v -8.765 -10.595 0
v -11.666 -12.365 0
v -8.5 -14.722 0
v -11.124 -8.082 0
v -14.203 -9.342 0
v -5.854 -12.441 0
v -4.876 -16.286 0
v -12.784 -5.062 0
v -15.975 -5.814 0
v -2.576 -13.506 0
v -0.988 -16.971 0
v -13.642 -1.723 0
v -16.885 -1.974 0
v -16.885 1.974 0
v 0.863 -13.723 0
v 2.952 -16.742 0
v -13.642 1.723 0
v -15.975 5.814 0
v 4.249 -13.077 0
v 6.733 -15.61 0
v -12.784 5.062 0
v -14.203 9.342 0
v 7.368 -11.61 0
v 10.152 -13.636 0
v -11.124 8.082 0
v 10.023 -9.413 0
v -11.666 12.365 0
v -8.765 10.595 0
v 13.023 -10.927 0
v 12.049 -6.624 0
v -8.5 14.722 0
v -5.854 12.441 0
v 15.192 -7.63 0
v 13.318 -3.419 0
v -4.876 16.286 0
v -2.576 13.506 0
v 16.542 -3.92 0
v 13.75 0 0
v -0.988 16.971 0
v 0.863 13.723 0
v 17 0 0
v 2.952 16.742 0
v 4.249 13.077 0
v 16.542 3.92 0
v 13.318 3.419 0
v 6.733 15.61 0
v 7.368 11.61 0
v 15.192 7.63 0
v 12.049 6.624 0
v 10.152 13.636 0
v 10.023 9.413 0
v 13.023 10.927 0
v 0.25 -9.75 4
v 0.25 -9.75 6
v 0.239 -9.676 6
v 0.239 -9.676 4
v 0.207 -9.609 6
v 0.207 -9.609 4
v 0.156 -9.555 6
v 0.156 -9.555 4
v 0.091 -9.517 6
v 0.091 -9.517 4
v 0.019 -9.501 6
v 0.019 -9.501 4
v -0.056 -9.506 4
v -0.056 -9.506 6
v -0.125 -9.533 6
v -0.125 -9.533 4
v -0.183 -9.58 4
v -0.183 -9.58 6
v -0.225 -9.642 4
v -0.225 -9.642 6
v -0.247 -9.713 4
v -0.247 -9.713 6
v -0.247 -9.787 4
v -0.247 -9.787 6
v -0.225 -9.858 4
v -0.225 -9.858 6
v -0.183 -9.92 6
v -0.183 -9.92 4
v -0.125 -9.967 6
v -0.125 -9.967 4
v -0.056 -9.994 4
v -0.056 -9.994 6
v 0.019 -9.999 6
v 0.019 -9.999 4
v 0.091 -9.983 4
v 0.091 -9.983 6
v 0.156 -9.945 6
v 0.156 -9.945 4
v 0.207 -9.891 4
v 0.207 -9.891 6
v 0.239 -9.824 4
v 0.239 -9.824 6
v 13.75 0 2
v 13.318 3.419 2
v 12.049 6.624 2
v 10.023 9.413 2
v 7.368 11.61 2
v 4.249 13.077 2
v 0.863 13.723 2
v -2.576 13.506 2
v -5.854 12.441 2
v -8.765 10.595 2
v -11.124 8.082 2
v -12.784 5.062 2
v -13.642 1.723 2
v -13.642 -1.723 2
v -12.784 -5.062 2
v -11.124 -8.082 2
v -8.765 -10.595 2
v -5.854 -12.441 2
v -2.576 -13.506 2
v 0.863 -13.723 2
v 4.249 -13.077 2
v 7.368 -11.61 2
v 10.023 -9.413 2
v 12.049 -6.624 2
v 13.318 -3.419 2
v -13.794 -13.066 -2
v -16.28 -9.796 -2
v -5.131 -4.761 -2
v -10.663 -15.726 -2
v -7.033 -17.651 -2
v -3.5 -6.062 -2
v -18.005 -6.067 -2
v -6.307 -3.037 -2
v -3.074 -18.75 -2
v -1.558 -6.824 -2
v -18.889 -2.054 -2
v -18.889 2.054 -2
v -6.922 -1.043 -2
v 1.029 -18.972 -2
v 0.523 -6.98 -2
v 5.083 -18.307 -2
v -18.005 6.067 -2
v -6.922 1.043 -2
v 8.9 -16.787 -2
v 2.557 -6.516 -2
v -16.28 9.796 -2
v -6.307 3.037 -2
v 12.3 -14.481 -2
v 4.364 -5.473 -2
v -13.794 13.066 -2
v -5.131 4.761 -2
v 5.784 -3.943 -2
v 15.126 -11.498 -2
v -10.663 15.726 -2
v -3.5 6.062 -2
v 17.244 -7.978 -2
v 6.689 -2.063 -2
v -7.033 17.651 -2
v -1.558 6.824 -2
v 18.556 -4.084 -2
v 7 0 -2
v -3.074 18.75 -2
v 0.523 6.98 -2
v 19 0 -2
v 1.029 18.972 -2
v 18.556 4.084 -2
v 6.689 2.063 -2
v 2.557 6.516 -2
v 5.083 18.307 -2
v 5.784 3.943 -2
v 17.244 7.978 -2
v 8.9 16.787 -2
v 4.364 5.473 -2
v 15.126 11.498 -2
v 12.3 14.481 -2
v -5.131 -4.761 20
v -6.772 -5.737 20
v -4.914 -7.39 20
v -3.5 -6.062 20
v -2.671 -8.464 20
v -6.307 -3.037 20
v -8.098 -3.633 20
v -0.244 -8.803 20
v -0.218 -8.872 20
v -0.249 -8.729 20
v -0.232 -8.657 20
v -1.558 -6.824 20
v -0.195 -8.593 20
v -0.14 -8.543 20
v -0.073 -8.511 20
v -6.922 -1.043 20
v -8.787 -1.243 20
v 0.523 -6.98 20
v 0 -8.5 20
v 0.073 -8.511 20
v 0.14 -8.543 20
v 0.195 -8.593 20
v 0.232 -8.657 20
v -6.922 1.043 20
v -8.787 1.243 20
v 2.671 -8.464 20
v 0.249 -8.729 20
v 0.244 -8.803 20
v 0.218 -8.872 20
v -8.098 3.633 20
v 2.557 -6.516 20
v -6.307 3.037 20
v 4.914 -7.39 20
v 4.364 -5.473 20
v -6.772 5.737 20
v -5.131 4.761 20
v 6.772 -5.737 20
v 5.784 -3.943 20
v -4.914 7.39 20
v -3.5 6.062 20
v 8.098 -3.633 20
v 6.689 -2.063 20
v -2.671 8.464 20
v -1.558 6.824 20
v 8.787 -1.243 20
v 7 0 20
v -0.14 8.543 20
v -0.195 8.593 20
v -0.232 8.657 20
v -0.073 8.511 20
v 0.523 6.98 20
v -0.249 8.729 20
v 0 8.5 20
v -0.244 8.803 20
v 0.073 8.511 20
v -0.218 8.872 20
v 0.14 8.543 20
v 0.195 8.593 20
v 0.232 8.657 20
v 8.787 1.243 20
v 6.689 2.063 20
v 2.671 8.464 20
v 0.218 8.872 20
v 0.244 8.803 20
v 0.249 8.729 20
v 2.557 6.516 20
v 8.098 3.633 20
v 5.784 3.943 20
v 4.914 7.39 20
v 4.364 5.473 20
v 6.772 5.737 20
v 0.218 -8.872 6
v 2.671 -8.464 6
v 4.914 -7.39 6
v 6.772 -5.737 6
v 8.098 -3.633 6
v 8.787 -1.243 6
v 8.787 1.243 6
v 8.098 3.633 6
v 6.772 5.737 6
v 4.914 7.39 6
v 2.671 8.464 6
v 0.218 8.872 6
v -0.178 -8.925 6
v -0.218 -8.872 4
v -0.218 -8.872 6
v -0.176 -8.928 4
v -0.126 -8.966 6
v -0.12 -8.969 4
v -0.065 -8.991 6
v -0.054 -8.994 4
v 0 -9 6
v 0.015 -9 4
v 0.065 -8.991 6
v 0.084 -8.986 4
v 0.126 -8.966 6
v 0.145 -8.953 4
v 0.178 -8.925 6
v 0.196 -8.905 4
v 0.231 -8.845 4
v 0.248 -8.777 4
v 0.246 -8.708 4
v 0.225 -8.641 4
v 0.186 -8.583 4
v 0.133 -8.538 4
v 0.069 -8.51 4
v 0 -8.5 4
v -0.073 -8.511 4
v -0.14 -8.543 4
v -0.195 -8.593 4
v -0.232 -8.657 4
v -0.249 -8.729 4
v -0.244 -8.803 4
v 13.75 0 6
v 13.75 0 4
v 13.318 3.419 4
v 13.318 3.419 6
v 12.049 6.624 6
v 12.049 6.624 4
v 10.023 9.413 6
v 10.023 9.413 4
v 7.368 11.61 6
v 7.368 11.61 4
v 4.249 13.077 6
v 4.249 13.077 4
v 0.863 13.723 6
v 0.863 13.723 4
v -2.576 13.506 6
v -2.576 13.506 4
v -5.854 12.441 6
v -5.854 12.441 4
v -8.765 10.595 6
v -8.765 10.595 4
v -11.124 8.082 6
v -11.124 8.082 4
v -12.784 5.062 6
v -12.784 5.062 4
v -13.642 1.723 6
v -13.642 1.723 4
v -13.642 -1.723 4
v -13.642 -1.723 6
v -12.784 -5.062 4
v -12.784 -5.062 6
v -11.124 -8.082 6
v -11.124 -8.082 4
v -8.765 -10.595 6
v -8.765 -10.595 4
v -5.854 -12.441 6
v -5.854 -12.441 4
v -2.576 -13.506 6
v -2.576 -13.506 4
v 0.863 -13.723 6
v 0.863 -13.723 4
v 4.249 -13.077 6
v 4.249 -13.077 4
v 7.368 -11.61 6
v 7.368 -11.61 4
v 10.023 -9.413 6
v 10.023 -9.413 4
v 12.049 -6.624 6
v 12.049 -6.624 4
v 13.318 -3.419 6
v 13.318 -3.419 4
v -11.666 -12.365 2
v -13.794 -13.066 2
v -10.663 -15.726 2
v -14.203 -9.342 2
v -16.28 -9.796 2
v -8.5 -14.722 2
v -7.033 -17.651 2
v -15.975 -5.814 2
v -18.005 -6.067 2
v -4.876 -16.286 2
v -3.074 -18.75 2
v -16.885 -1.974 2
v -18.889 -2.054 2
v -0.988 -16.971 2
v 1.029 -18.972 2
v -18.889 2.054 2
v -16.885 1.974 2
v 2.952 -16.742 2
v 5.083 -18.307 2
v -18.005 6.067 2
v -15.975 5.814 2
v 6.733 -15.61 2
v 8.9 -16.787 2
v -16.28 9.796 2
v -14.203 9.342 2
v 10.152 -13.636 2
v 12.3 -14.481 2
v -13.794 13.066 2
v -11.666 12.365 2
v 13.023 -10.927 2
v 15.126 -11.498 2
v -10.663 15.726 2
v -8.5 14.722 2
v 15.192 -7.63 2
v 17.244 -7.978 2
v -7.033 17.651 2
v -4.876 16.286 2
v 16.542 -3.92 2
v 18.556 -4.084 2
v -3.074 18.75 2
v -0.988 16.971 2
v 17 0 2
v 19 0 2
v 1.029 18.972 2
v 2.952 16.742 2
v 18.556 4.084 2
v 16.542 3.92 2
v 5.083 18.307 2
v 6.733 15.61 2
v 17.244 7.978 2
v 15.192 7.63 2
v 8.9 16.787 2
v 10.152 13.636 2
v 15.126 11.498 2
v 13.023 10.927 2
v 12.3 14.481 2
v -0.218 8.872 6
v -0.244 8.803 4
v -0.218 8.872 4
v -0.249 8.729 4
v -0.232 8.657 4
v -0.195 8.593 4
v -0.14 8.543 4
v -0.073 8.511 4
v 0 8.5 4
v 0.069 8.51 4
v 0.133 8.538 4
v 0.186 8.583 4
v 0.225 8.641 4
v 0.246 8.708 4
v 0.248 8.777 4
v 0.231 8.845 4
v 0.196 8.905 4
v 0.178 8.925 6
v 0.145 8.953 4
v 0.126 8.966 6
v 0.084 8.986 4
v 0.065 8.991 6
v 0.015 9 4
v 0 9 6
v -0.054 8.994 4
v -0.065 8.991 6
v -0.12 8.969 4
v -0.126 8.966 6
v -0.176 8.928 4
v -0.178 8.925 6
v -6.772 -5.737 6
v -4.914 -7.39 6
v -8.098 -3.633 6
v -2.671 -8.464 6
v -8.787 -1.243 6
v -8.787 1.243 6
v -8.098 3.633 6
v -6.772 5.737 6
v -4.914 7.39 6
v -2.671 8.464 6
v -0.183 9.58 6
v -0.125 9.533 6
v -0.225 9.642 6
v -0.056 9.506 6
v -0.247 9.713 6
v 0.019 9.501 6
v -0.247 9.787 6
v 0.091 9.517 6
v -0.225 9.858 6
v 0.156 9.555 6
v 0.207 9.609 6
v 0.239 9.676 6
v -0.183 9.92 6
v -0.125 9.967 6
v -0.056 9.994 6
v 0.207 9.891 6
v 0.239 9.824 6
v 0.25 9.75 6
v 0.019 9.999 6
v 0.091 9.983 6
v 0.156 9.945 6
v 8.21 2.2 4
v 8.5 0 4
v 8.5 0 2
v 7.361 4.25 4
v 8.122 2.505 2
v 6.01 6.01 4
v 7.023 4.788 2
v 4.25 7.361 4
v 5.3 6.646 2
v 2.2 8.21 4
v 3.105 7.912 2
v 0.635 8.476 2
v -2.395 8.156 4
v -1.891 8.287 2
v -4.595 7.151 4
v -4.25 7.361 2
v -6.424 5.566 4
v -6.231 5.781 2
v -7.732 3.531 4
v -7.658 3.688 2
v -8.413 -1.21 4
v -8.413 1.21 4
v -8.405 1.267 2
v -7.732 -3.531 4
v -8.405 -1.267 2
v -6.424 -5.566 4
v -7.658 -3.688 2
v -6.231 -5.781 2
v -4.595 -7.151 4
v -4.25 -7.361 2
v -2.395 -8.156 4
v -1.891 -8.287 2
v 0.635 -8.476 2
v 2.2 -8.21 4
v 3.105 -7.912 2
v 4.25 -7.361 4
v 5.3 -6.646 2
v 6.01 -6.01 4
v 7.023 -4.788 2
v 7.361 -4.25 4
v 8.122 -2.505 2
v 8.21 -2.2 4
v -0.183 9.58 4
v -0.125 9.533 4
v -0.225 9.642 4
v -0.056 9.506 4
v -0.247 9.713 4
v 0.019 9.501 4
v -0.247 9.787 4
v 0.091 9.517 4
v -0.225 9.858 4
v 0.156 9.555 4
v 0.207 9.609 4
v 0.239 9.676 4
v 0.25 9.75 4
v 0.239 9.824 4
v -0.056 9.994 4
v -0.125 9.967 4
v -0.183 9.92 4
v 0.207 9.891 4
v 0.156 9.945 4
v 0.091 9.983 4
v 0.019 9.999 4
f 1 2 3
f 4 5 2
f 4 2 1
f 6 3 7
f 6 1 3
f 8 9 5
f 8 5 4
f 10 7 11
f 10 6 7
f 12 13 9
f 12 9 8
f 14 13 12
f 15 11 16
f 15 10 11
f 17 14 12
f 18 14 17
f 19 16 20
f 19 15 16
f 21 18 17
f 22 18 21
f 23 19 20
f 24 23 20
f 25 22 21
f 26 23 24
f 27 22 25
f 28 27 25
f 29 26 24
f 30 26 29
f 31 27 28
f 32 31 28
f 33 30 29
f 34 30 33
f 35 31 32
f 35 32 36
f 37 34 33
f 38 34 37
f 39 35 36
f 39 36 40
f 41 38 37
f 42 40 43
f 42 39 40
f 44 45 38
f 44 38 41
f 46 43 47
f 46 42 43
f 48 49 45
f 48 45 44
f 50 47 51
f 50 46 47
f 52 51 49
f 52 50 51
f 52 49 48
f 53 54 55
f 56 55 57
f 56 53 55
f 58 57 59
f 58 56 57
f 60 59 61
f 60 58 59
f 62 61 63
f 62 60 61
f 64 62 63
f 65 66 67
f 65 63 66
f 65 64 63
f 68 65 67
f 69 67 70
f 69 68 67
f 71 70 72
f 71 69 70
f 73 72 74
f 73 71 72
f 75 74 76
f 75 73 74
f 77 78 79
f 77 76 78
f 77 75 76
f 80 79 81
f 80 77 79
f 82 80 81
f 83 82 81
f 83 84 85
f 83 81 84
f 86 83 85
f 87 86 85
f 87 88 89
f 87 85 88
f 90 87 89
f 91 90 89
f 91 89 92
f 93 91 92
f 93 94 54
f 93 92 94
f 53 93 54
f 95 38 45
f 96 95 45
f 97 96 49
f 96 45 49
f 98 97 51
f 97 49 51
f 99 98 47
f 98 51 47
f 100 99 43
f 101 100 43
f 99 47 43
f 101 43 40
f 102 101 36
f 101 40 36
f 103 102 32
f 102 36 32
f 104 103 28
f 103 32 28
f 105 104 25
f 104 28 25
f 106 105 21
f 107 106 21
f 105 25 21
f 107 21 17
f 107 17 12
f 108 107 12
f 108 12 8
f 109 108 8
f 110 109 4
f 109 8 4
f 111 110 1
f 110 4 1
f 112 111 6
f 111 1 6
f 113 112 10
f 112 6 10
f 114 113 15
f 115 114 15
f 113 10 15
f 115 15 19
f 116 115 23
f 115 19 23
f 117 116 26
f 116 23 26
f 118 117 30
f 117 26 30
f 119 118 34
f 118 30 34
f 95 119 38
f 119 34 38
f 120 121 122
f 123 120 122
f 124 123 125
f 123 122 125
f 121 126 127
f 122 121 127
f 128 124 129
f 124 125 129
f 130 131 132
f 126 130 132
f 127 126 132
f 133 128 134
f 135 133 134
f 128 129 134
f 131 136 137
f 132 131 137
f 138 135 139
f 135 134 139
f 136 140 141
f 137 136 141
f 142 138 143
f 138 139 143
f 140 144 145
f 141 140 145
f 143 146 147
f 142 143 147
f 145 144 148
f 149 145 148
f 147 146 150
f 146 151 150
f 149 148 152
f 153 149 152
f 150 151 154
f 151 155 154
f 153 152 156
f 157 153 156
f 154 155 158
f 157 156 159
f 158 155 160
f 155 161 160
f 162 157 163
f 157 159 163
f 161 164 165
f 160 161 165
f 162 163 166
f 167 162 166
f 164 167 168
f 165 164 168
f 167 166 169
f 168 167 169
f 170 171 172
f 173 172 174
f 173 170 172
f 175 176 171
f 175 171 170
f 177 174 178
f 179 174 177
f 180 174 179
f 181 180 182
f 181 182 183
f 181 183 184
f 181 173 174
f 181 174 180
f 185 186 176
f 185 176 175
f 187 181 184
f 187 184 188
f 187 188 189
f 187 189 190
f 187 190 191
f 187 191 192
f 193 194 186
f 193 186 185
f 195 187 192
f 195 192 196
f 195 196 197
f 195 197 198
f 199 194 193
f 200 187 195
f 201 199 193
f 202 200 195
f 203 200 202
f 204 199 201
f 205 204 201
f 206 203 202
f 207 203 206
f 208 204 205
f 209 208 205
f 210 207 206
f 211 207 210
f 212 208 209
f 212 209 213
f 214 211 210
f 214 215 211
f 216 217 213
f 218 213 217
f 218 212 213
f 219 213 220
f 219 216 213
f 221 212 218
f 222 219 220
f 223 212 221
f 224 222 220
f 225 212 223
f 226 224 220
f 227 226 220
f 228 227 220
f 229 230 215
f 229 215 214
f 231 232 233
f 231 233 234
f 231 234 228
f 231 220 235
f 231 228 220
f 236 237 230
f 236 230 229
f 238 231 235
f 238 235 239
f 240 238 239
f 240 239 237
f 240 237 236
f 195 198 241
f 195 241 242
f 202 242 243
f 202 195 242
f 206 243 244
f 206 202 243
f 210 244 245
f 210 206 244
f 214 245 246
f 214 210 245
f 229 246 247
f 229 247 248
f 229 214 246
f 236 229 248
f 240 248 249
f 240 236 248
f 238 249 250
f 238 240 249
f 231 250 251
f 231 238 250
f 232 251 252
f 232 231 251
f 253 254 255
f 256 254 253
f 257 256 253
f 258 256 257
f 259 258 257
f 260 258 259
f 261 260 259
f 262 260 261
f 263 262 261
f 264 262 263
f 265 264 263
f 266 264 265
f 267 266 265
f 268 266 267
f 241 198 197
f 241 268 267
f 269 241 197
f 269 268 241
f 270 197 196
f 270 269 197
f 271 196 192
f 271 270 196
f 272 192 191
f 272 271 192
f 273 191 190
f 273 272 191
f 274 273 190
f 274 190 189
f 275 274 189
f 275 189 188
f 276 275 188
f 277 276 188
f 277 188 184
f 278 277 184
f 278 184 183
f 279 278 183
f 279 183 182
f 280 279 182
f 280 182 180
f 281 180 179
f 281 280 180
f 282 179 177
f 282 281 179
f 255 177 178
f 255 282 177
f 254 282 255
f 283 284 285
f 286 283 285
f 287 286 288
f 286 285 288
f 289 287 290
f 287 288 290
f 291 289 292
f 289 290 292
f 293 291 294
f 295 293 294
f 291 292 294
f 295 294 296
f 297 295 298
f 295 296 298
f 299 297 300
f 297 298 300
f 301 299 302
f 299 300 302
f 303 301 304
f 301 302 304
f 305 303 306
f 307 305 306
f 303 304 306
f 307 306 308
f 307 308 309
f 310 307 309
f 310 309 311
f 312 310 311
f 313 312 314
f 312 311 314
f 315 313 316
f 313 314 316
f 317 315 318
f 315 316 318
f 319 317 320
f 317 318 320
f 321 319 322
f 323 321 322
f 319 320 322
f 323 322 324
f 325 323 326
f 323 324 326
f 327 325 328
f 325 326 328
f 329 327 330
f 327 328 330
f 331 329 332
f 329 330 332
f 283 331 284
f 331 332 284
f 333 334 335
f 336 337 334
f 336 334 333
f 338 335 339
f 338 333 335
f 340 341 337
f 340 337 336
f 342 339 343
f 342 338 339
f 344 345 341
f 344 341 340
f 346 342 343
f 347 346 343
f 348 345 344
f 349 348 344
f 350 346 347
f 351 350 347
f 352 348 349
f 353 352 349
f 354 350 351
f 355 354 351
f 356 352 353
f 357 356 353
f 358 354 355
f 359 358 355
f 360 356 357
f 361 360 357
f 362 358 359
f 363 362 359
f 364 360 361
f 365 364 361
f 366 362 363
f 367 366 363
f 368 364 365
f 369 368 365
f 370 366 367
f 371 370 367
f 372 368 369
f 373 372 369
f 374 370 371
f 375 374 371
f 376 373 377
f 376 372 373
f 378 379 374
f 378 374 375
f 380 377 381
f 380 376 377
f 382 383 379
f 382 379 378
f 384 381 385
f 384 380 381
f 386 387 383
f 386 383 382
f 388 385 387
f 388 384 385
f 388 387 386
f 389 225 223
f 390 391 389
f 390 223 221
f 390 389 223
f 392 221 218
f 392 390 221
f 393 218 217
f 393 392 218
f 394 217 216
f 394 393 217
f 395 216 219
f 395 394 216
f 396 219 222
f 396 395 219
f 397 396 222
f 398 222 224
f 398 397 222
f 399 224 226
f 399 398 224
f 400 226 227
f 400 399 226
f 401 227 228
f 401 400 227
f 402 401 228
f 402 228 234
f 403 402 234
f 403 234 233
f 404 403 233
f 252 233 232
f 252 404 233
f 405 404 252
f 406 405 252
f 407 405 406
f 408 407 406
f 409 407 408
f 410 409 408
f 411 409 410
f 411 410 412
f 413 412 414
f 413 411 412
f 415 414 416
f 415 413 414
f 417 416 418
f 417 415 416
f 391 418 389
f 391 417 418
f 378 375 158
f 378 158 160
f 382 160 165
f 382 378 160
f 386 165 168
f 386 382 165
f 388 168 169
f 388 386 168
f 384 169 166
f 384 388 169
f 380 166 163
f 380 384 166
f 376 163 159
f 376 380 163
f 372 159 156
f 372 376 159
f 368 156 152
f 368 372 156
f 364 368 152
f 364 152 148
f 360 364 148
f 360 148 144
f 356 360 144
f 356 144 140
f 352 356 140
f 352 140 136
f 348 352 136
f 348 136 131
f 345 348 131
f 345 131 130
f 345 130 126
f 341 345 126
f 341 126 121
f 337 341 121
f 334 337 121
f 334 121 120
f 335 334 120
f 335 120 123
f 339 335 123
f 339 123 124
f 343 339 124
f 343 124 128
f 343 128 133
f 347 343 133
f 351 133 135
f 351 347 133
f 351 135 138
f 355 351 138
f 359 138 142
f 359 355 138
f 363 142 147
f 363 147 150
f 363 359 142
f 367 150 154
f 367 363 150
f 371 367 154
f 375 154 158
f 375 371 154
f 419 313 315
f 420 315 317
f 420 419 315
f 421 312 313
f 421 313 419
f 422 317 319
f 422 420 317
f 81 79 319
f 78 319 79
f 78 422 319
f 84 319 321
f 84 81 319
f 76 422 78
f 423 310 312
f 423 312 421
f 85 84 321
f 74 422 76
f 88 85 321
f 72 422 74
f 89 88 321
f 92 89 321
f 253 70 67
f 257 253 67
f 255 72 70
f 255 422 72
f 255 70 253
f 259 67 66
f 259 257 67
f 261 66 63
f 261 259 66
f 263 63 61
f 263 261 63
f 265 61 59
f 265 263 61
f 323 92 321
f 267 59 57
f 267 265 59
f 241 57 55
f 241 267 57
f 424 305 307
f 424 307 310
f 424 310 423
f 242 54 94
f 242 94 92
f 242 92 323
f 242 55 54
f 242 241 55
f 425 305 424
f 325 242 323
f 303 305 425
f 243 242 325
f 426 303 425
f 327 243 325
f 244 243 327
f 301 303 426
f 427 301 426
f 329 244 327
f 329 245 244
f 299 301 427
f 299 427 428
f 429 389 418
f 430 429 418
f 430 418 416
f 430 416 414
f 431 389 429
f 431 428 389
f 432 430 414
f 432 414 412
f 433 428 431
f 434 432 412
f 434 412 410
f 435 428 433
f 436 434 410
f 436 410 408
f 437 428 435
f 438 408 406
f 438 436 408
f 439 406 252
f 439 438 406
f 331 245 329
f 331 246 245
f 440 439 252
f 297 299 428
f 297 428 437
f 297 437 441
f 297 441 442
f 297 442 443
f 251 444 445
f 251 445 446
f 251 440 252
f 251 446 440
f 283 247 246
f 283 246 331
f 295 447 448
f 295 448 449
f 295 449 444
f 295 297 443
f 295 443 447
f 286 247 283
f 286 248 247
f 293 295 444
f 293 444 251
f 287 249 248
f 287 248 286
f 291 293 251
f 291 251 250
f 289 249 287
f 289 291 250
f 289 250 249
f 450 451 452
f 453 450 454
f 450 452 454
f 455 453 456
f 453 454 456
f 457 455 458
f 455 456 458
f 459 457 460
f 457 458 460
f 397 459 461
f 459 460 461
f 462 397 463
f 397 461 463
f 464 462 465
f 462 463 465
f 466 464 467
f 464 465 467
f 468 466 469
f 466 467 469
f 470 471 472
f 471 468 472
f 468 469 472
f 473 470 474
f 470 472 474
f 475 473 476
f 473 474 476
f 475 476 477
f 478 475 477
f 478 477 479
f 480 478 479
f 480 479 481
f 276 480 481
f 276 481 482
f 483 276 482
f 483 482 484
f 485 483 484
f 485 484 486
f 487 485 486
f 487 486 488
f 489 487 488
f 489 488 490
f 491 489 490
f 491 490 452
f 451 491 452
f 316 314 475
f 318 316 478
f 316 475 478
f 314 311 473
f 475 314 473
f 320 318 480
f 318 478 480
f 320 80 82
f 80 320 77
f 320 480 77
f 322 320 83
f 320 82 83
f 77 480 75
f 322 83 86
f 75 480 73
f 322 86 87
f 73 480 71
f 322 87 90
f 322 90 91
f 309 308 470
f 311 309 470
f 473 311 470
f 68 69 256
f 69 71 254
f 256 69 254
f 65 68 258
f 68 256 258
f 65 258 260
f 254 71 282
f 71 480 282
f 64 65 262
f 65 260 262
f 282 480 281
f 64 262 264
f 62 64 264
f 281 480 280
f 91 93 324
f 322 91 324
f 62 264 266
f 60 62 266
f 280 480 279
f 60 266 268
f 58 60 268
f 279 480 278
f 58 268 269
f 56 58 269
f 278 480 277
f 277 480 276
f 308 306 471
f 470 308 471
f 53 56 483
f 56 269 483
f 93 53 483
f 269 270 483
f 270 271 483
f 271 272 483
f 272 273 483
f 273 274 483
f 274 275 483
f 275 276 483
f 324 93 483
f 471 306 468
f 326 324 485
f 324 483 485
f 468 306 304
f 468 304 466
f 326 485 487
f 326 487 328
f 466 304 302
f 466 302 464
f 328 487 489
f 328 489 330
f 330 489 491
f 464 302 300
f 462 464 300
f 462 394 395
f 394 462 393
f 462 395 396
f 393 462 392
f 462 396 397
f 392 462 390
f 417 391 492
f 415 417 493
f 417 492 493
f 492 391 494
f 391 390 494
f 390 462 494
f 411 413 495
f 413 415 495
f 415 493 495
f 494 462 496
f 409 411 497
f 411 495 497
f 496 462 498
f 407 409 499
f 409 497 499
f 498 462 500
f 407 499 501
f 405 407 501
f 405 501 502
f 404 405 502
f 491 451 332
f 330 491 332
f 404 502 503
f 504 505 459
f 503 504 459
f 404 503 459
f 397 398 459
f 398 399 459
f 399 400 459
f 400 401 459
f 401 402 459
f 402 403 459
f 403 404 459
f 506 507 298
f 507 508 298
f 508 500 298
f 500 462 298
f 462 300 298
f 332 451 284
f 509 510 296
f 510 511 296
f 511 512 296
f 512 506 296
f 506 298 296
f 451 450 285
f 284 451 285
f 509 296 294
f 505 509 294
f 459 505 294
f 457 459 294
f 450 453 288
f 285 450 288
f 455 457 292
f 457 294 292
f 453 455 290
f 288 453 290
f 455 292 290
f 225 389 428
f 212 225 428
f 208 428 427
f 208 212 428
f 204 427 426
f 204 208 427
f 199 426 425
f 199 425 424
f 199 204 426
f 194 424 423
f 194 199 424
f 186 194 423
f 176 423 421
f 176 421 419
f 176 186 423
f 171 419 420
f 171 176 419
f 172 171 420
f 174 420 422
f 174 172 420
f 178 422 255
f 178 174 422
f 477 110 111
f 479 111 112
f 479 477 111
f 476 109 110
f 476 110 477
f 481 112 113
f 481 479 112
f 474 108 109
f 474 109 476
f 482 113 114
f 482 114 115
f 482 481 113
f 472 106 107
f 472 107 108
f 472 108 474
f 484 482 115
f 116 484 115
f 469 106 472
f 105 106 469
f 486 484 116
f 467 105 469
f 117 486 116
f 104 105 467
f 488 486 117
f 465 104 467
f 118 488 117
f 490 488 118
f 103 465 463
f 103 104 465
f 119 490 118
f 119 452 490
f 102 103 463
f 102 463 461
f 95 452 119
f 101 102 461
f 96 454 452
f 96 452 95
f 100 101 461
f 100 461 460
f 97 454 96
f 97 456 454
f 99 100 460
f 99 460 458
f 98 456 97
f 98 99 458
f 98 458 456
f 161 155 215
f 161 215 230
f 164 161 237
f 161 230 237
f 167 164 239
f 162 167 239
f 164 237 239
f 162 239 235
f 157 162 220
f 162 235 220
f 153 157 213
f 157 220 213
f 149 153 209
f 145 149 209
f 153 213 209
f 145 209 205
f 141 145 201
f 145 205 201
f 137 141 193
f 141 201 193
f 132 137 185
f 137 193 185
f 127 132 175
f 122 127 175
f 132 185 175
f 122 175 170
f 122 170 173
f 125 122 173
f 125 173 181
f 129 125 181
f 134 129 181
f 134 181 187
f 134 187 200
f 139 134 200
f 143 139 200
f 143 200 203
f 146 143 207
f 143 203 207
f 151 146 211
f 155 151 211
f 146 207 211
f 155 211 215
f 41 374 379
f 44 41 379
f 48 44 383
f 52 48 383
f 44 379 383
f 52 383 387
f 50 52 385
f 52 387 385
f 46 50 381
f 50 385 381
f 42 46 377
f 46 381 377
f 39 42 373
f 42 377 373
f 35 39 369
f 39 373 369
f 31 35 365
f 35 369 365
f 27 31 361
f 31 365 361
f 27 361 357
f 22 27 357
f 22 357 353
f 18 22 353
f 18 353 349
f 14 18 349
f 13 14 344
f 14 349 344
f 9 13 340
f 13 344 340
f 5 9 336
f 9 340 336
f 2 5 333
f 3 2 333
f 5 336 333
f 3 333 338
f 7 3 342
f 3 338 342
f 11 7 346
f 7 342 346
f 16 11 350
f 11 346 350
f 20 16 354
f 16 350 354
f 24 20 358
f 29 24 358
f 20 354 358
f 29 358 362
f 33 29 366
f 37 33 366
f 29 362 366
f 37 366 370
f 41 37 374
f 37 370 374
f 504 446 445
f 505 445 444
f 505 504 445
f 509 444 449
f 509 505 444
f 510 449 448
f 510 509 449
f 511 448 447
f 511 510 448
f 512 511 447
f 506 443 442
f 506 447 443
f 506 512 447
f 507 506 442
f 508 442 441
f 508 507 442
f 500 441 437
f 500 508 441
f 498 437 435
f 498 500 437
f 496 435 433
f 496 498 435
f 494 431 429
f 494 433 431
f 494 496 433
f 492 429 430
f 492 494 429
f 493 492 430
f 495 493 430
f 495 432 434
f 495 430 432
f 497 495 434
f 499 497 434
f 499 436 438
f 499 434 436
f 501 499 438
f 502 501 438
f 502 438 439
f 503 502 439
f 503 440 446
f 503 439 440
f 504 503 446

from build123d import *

# Parameters (mm, degrees)
SKETCH1_R           = 13.75
BOSS_EXTRUDE1_DEPTH = 2
SKETCH2_R           = 8.5
BOSS_EXTRUDE2_DEPTH = 6
BOSS_EXTRUDE3_START = 4
SKETCH3_R           = 13.75
BOSS_EXTRUDE3_DEPTH = 2
SKETCH5_R           = 7
CUT_EXTRUDE2_DEPTH  = 37.5
BOSS_EXTRUDE4_START = 20
SKETCH6_R           = 8.875
SKETCH6_R_2         = 7
BOSS_EXTRUDE4_DEPTH = 14
CUT_EXTRUDE3_START  = 4
SKETCH9_R           = 0.25
CUT_EXTRUDE3_DEPTH  = 24.894892006
SKETCH10_R          = 19
BOSS_EXTRUDE5_DEPTH = 2
SKETCH11_R          = 7
CUT_EXTRUDE4_DEPTH  = 2
BOSS_EXTRUDE6_START = 2
SKETCH12_R          = 19
SKETCH12_R_2        = 17
BOSS_EXTRUDE6_DEPTH = 2


with BuildPart() as part:
    # Sketch1 → Boss-Extrude1 (new body)
    with BuildSketch(Plane.XY):
        Circle(SKETCH1_R)
    extrude(amount=BOSS_EXTRUDE1_DEPTH)

    # Sketch2 → Boss-Extrude2 (add)
    with BuildSketch(Plane.XY):
        Circle(SKETCH2_R)
    extrude(amount=BOSS_EXTRUDE2_DEPTH)

    # Sketch3 → Boss-Extrude3 (add)
    with BuildSketch(Plane.XY.offset(BOSS_EXTRUDE3_START)):
        Circle(SKETCH3_R)
    extrude(amount=BOSS_EXTRUDE3_DEPTH)

    # Sketch5 → Cut-Extrude2 (cut, symmetric)
    with BuildSketch(Plane.XY):
        Circle(SKETCH5_R)
    extrude(amount=CUT_EXTRUDE2_DEPTH, both=True, mode=Mode.SUBTRACT)

    # Sketch6 → Boss-Extrude4 (add)
    with BuildSketch(Plane.XY.offset(BOSS_EXTRUDE4_START)):
        Circle(SKETCH6_R)
        Circle(SKETCH6_R_2, mode=Mode.SUBTRACT)
    extrude(amount=-BOSS_EXTRUDE4_DEPTH)

    # Sketch9 → Cut-Extrude3 (cut, through all)
    with BuildSketch(Plane.XY.offset(CUT_EXTRUDE3_START)):
        with Locations((0, 9.75)):
            Circle(SKETCH9_R)
        with Locations((0, -9.75)):
            Circle(SKETCH9_R)
        with Locations(Location((0, 8.75, 0), (0, 0, 150.706355545))):
            Circle(SKETCH9_R)
        with Locations(Location((0, -8.75, 0), (0, 0, 209.293644455))):
            Circle(SKETCH9_R)
    extrude(amount=CUT_EXTRUDE3_DEPTH, mode=Mode.SUBTRACT)

    # Sketch10 → Boss-Extrude5 (add)
    with BuildSketch(Plane.XY):
        Circle(SKETCH10_R)
    extrude(amount=-BOSS_EXTRUDE5_DEPTH)

    # Sketch11 → Cut-Extrude4 (cut)
    with BuildSketch(Plane.XY):
        Circle(SKETCH11_R)
    extrude(amount=-CUT_EXTRUDE4_DEPTH, mode=Mode.SUBTRACT)

    # Sketch12 → Boss-Extrude6 (add)
    with BuildSketch(Plane.XY.offset(BOSS_EXTRUDE6_START)):
        Circle(SKETCH12_R)
        Circle(SKETCH12_R_2, mode=Mode.SUBTRACT)
    extrude(amount=-BOSS_EXTRUDE6_DEPTH)


solid = part.part
